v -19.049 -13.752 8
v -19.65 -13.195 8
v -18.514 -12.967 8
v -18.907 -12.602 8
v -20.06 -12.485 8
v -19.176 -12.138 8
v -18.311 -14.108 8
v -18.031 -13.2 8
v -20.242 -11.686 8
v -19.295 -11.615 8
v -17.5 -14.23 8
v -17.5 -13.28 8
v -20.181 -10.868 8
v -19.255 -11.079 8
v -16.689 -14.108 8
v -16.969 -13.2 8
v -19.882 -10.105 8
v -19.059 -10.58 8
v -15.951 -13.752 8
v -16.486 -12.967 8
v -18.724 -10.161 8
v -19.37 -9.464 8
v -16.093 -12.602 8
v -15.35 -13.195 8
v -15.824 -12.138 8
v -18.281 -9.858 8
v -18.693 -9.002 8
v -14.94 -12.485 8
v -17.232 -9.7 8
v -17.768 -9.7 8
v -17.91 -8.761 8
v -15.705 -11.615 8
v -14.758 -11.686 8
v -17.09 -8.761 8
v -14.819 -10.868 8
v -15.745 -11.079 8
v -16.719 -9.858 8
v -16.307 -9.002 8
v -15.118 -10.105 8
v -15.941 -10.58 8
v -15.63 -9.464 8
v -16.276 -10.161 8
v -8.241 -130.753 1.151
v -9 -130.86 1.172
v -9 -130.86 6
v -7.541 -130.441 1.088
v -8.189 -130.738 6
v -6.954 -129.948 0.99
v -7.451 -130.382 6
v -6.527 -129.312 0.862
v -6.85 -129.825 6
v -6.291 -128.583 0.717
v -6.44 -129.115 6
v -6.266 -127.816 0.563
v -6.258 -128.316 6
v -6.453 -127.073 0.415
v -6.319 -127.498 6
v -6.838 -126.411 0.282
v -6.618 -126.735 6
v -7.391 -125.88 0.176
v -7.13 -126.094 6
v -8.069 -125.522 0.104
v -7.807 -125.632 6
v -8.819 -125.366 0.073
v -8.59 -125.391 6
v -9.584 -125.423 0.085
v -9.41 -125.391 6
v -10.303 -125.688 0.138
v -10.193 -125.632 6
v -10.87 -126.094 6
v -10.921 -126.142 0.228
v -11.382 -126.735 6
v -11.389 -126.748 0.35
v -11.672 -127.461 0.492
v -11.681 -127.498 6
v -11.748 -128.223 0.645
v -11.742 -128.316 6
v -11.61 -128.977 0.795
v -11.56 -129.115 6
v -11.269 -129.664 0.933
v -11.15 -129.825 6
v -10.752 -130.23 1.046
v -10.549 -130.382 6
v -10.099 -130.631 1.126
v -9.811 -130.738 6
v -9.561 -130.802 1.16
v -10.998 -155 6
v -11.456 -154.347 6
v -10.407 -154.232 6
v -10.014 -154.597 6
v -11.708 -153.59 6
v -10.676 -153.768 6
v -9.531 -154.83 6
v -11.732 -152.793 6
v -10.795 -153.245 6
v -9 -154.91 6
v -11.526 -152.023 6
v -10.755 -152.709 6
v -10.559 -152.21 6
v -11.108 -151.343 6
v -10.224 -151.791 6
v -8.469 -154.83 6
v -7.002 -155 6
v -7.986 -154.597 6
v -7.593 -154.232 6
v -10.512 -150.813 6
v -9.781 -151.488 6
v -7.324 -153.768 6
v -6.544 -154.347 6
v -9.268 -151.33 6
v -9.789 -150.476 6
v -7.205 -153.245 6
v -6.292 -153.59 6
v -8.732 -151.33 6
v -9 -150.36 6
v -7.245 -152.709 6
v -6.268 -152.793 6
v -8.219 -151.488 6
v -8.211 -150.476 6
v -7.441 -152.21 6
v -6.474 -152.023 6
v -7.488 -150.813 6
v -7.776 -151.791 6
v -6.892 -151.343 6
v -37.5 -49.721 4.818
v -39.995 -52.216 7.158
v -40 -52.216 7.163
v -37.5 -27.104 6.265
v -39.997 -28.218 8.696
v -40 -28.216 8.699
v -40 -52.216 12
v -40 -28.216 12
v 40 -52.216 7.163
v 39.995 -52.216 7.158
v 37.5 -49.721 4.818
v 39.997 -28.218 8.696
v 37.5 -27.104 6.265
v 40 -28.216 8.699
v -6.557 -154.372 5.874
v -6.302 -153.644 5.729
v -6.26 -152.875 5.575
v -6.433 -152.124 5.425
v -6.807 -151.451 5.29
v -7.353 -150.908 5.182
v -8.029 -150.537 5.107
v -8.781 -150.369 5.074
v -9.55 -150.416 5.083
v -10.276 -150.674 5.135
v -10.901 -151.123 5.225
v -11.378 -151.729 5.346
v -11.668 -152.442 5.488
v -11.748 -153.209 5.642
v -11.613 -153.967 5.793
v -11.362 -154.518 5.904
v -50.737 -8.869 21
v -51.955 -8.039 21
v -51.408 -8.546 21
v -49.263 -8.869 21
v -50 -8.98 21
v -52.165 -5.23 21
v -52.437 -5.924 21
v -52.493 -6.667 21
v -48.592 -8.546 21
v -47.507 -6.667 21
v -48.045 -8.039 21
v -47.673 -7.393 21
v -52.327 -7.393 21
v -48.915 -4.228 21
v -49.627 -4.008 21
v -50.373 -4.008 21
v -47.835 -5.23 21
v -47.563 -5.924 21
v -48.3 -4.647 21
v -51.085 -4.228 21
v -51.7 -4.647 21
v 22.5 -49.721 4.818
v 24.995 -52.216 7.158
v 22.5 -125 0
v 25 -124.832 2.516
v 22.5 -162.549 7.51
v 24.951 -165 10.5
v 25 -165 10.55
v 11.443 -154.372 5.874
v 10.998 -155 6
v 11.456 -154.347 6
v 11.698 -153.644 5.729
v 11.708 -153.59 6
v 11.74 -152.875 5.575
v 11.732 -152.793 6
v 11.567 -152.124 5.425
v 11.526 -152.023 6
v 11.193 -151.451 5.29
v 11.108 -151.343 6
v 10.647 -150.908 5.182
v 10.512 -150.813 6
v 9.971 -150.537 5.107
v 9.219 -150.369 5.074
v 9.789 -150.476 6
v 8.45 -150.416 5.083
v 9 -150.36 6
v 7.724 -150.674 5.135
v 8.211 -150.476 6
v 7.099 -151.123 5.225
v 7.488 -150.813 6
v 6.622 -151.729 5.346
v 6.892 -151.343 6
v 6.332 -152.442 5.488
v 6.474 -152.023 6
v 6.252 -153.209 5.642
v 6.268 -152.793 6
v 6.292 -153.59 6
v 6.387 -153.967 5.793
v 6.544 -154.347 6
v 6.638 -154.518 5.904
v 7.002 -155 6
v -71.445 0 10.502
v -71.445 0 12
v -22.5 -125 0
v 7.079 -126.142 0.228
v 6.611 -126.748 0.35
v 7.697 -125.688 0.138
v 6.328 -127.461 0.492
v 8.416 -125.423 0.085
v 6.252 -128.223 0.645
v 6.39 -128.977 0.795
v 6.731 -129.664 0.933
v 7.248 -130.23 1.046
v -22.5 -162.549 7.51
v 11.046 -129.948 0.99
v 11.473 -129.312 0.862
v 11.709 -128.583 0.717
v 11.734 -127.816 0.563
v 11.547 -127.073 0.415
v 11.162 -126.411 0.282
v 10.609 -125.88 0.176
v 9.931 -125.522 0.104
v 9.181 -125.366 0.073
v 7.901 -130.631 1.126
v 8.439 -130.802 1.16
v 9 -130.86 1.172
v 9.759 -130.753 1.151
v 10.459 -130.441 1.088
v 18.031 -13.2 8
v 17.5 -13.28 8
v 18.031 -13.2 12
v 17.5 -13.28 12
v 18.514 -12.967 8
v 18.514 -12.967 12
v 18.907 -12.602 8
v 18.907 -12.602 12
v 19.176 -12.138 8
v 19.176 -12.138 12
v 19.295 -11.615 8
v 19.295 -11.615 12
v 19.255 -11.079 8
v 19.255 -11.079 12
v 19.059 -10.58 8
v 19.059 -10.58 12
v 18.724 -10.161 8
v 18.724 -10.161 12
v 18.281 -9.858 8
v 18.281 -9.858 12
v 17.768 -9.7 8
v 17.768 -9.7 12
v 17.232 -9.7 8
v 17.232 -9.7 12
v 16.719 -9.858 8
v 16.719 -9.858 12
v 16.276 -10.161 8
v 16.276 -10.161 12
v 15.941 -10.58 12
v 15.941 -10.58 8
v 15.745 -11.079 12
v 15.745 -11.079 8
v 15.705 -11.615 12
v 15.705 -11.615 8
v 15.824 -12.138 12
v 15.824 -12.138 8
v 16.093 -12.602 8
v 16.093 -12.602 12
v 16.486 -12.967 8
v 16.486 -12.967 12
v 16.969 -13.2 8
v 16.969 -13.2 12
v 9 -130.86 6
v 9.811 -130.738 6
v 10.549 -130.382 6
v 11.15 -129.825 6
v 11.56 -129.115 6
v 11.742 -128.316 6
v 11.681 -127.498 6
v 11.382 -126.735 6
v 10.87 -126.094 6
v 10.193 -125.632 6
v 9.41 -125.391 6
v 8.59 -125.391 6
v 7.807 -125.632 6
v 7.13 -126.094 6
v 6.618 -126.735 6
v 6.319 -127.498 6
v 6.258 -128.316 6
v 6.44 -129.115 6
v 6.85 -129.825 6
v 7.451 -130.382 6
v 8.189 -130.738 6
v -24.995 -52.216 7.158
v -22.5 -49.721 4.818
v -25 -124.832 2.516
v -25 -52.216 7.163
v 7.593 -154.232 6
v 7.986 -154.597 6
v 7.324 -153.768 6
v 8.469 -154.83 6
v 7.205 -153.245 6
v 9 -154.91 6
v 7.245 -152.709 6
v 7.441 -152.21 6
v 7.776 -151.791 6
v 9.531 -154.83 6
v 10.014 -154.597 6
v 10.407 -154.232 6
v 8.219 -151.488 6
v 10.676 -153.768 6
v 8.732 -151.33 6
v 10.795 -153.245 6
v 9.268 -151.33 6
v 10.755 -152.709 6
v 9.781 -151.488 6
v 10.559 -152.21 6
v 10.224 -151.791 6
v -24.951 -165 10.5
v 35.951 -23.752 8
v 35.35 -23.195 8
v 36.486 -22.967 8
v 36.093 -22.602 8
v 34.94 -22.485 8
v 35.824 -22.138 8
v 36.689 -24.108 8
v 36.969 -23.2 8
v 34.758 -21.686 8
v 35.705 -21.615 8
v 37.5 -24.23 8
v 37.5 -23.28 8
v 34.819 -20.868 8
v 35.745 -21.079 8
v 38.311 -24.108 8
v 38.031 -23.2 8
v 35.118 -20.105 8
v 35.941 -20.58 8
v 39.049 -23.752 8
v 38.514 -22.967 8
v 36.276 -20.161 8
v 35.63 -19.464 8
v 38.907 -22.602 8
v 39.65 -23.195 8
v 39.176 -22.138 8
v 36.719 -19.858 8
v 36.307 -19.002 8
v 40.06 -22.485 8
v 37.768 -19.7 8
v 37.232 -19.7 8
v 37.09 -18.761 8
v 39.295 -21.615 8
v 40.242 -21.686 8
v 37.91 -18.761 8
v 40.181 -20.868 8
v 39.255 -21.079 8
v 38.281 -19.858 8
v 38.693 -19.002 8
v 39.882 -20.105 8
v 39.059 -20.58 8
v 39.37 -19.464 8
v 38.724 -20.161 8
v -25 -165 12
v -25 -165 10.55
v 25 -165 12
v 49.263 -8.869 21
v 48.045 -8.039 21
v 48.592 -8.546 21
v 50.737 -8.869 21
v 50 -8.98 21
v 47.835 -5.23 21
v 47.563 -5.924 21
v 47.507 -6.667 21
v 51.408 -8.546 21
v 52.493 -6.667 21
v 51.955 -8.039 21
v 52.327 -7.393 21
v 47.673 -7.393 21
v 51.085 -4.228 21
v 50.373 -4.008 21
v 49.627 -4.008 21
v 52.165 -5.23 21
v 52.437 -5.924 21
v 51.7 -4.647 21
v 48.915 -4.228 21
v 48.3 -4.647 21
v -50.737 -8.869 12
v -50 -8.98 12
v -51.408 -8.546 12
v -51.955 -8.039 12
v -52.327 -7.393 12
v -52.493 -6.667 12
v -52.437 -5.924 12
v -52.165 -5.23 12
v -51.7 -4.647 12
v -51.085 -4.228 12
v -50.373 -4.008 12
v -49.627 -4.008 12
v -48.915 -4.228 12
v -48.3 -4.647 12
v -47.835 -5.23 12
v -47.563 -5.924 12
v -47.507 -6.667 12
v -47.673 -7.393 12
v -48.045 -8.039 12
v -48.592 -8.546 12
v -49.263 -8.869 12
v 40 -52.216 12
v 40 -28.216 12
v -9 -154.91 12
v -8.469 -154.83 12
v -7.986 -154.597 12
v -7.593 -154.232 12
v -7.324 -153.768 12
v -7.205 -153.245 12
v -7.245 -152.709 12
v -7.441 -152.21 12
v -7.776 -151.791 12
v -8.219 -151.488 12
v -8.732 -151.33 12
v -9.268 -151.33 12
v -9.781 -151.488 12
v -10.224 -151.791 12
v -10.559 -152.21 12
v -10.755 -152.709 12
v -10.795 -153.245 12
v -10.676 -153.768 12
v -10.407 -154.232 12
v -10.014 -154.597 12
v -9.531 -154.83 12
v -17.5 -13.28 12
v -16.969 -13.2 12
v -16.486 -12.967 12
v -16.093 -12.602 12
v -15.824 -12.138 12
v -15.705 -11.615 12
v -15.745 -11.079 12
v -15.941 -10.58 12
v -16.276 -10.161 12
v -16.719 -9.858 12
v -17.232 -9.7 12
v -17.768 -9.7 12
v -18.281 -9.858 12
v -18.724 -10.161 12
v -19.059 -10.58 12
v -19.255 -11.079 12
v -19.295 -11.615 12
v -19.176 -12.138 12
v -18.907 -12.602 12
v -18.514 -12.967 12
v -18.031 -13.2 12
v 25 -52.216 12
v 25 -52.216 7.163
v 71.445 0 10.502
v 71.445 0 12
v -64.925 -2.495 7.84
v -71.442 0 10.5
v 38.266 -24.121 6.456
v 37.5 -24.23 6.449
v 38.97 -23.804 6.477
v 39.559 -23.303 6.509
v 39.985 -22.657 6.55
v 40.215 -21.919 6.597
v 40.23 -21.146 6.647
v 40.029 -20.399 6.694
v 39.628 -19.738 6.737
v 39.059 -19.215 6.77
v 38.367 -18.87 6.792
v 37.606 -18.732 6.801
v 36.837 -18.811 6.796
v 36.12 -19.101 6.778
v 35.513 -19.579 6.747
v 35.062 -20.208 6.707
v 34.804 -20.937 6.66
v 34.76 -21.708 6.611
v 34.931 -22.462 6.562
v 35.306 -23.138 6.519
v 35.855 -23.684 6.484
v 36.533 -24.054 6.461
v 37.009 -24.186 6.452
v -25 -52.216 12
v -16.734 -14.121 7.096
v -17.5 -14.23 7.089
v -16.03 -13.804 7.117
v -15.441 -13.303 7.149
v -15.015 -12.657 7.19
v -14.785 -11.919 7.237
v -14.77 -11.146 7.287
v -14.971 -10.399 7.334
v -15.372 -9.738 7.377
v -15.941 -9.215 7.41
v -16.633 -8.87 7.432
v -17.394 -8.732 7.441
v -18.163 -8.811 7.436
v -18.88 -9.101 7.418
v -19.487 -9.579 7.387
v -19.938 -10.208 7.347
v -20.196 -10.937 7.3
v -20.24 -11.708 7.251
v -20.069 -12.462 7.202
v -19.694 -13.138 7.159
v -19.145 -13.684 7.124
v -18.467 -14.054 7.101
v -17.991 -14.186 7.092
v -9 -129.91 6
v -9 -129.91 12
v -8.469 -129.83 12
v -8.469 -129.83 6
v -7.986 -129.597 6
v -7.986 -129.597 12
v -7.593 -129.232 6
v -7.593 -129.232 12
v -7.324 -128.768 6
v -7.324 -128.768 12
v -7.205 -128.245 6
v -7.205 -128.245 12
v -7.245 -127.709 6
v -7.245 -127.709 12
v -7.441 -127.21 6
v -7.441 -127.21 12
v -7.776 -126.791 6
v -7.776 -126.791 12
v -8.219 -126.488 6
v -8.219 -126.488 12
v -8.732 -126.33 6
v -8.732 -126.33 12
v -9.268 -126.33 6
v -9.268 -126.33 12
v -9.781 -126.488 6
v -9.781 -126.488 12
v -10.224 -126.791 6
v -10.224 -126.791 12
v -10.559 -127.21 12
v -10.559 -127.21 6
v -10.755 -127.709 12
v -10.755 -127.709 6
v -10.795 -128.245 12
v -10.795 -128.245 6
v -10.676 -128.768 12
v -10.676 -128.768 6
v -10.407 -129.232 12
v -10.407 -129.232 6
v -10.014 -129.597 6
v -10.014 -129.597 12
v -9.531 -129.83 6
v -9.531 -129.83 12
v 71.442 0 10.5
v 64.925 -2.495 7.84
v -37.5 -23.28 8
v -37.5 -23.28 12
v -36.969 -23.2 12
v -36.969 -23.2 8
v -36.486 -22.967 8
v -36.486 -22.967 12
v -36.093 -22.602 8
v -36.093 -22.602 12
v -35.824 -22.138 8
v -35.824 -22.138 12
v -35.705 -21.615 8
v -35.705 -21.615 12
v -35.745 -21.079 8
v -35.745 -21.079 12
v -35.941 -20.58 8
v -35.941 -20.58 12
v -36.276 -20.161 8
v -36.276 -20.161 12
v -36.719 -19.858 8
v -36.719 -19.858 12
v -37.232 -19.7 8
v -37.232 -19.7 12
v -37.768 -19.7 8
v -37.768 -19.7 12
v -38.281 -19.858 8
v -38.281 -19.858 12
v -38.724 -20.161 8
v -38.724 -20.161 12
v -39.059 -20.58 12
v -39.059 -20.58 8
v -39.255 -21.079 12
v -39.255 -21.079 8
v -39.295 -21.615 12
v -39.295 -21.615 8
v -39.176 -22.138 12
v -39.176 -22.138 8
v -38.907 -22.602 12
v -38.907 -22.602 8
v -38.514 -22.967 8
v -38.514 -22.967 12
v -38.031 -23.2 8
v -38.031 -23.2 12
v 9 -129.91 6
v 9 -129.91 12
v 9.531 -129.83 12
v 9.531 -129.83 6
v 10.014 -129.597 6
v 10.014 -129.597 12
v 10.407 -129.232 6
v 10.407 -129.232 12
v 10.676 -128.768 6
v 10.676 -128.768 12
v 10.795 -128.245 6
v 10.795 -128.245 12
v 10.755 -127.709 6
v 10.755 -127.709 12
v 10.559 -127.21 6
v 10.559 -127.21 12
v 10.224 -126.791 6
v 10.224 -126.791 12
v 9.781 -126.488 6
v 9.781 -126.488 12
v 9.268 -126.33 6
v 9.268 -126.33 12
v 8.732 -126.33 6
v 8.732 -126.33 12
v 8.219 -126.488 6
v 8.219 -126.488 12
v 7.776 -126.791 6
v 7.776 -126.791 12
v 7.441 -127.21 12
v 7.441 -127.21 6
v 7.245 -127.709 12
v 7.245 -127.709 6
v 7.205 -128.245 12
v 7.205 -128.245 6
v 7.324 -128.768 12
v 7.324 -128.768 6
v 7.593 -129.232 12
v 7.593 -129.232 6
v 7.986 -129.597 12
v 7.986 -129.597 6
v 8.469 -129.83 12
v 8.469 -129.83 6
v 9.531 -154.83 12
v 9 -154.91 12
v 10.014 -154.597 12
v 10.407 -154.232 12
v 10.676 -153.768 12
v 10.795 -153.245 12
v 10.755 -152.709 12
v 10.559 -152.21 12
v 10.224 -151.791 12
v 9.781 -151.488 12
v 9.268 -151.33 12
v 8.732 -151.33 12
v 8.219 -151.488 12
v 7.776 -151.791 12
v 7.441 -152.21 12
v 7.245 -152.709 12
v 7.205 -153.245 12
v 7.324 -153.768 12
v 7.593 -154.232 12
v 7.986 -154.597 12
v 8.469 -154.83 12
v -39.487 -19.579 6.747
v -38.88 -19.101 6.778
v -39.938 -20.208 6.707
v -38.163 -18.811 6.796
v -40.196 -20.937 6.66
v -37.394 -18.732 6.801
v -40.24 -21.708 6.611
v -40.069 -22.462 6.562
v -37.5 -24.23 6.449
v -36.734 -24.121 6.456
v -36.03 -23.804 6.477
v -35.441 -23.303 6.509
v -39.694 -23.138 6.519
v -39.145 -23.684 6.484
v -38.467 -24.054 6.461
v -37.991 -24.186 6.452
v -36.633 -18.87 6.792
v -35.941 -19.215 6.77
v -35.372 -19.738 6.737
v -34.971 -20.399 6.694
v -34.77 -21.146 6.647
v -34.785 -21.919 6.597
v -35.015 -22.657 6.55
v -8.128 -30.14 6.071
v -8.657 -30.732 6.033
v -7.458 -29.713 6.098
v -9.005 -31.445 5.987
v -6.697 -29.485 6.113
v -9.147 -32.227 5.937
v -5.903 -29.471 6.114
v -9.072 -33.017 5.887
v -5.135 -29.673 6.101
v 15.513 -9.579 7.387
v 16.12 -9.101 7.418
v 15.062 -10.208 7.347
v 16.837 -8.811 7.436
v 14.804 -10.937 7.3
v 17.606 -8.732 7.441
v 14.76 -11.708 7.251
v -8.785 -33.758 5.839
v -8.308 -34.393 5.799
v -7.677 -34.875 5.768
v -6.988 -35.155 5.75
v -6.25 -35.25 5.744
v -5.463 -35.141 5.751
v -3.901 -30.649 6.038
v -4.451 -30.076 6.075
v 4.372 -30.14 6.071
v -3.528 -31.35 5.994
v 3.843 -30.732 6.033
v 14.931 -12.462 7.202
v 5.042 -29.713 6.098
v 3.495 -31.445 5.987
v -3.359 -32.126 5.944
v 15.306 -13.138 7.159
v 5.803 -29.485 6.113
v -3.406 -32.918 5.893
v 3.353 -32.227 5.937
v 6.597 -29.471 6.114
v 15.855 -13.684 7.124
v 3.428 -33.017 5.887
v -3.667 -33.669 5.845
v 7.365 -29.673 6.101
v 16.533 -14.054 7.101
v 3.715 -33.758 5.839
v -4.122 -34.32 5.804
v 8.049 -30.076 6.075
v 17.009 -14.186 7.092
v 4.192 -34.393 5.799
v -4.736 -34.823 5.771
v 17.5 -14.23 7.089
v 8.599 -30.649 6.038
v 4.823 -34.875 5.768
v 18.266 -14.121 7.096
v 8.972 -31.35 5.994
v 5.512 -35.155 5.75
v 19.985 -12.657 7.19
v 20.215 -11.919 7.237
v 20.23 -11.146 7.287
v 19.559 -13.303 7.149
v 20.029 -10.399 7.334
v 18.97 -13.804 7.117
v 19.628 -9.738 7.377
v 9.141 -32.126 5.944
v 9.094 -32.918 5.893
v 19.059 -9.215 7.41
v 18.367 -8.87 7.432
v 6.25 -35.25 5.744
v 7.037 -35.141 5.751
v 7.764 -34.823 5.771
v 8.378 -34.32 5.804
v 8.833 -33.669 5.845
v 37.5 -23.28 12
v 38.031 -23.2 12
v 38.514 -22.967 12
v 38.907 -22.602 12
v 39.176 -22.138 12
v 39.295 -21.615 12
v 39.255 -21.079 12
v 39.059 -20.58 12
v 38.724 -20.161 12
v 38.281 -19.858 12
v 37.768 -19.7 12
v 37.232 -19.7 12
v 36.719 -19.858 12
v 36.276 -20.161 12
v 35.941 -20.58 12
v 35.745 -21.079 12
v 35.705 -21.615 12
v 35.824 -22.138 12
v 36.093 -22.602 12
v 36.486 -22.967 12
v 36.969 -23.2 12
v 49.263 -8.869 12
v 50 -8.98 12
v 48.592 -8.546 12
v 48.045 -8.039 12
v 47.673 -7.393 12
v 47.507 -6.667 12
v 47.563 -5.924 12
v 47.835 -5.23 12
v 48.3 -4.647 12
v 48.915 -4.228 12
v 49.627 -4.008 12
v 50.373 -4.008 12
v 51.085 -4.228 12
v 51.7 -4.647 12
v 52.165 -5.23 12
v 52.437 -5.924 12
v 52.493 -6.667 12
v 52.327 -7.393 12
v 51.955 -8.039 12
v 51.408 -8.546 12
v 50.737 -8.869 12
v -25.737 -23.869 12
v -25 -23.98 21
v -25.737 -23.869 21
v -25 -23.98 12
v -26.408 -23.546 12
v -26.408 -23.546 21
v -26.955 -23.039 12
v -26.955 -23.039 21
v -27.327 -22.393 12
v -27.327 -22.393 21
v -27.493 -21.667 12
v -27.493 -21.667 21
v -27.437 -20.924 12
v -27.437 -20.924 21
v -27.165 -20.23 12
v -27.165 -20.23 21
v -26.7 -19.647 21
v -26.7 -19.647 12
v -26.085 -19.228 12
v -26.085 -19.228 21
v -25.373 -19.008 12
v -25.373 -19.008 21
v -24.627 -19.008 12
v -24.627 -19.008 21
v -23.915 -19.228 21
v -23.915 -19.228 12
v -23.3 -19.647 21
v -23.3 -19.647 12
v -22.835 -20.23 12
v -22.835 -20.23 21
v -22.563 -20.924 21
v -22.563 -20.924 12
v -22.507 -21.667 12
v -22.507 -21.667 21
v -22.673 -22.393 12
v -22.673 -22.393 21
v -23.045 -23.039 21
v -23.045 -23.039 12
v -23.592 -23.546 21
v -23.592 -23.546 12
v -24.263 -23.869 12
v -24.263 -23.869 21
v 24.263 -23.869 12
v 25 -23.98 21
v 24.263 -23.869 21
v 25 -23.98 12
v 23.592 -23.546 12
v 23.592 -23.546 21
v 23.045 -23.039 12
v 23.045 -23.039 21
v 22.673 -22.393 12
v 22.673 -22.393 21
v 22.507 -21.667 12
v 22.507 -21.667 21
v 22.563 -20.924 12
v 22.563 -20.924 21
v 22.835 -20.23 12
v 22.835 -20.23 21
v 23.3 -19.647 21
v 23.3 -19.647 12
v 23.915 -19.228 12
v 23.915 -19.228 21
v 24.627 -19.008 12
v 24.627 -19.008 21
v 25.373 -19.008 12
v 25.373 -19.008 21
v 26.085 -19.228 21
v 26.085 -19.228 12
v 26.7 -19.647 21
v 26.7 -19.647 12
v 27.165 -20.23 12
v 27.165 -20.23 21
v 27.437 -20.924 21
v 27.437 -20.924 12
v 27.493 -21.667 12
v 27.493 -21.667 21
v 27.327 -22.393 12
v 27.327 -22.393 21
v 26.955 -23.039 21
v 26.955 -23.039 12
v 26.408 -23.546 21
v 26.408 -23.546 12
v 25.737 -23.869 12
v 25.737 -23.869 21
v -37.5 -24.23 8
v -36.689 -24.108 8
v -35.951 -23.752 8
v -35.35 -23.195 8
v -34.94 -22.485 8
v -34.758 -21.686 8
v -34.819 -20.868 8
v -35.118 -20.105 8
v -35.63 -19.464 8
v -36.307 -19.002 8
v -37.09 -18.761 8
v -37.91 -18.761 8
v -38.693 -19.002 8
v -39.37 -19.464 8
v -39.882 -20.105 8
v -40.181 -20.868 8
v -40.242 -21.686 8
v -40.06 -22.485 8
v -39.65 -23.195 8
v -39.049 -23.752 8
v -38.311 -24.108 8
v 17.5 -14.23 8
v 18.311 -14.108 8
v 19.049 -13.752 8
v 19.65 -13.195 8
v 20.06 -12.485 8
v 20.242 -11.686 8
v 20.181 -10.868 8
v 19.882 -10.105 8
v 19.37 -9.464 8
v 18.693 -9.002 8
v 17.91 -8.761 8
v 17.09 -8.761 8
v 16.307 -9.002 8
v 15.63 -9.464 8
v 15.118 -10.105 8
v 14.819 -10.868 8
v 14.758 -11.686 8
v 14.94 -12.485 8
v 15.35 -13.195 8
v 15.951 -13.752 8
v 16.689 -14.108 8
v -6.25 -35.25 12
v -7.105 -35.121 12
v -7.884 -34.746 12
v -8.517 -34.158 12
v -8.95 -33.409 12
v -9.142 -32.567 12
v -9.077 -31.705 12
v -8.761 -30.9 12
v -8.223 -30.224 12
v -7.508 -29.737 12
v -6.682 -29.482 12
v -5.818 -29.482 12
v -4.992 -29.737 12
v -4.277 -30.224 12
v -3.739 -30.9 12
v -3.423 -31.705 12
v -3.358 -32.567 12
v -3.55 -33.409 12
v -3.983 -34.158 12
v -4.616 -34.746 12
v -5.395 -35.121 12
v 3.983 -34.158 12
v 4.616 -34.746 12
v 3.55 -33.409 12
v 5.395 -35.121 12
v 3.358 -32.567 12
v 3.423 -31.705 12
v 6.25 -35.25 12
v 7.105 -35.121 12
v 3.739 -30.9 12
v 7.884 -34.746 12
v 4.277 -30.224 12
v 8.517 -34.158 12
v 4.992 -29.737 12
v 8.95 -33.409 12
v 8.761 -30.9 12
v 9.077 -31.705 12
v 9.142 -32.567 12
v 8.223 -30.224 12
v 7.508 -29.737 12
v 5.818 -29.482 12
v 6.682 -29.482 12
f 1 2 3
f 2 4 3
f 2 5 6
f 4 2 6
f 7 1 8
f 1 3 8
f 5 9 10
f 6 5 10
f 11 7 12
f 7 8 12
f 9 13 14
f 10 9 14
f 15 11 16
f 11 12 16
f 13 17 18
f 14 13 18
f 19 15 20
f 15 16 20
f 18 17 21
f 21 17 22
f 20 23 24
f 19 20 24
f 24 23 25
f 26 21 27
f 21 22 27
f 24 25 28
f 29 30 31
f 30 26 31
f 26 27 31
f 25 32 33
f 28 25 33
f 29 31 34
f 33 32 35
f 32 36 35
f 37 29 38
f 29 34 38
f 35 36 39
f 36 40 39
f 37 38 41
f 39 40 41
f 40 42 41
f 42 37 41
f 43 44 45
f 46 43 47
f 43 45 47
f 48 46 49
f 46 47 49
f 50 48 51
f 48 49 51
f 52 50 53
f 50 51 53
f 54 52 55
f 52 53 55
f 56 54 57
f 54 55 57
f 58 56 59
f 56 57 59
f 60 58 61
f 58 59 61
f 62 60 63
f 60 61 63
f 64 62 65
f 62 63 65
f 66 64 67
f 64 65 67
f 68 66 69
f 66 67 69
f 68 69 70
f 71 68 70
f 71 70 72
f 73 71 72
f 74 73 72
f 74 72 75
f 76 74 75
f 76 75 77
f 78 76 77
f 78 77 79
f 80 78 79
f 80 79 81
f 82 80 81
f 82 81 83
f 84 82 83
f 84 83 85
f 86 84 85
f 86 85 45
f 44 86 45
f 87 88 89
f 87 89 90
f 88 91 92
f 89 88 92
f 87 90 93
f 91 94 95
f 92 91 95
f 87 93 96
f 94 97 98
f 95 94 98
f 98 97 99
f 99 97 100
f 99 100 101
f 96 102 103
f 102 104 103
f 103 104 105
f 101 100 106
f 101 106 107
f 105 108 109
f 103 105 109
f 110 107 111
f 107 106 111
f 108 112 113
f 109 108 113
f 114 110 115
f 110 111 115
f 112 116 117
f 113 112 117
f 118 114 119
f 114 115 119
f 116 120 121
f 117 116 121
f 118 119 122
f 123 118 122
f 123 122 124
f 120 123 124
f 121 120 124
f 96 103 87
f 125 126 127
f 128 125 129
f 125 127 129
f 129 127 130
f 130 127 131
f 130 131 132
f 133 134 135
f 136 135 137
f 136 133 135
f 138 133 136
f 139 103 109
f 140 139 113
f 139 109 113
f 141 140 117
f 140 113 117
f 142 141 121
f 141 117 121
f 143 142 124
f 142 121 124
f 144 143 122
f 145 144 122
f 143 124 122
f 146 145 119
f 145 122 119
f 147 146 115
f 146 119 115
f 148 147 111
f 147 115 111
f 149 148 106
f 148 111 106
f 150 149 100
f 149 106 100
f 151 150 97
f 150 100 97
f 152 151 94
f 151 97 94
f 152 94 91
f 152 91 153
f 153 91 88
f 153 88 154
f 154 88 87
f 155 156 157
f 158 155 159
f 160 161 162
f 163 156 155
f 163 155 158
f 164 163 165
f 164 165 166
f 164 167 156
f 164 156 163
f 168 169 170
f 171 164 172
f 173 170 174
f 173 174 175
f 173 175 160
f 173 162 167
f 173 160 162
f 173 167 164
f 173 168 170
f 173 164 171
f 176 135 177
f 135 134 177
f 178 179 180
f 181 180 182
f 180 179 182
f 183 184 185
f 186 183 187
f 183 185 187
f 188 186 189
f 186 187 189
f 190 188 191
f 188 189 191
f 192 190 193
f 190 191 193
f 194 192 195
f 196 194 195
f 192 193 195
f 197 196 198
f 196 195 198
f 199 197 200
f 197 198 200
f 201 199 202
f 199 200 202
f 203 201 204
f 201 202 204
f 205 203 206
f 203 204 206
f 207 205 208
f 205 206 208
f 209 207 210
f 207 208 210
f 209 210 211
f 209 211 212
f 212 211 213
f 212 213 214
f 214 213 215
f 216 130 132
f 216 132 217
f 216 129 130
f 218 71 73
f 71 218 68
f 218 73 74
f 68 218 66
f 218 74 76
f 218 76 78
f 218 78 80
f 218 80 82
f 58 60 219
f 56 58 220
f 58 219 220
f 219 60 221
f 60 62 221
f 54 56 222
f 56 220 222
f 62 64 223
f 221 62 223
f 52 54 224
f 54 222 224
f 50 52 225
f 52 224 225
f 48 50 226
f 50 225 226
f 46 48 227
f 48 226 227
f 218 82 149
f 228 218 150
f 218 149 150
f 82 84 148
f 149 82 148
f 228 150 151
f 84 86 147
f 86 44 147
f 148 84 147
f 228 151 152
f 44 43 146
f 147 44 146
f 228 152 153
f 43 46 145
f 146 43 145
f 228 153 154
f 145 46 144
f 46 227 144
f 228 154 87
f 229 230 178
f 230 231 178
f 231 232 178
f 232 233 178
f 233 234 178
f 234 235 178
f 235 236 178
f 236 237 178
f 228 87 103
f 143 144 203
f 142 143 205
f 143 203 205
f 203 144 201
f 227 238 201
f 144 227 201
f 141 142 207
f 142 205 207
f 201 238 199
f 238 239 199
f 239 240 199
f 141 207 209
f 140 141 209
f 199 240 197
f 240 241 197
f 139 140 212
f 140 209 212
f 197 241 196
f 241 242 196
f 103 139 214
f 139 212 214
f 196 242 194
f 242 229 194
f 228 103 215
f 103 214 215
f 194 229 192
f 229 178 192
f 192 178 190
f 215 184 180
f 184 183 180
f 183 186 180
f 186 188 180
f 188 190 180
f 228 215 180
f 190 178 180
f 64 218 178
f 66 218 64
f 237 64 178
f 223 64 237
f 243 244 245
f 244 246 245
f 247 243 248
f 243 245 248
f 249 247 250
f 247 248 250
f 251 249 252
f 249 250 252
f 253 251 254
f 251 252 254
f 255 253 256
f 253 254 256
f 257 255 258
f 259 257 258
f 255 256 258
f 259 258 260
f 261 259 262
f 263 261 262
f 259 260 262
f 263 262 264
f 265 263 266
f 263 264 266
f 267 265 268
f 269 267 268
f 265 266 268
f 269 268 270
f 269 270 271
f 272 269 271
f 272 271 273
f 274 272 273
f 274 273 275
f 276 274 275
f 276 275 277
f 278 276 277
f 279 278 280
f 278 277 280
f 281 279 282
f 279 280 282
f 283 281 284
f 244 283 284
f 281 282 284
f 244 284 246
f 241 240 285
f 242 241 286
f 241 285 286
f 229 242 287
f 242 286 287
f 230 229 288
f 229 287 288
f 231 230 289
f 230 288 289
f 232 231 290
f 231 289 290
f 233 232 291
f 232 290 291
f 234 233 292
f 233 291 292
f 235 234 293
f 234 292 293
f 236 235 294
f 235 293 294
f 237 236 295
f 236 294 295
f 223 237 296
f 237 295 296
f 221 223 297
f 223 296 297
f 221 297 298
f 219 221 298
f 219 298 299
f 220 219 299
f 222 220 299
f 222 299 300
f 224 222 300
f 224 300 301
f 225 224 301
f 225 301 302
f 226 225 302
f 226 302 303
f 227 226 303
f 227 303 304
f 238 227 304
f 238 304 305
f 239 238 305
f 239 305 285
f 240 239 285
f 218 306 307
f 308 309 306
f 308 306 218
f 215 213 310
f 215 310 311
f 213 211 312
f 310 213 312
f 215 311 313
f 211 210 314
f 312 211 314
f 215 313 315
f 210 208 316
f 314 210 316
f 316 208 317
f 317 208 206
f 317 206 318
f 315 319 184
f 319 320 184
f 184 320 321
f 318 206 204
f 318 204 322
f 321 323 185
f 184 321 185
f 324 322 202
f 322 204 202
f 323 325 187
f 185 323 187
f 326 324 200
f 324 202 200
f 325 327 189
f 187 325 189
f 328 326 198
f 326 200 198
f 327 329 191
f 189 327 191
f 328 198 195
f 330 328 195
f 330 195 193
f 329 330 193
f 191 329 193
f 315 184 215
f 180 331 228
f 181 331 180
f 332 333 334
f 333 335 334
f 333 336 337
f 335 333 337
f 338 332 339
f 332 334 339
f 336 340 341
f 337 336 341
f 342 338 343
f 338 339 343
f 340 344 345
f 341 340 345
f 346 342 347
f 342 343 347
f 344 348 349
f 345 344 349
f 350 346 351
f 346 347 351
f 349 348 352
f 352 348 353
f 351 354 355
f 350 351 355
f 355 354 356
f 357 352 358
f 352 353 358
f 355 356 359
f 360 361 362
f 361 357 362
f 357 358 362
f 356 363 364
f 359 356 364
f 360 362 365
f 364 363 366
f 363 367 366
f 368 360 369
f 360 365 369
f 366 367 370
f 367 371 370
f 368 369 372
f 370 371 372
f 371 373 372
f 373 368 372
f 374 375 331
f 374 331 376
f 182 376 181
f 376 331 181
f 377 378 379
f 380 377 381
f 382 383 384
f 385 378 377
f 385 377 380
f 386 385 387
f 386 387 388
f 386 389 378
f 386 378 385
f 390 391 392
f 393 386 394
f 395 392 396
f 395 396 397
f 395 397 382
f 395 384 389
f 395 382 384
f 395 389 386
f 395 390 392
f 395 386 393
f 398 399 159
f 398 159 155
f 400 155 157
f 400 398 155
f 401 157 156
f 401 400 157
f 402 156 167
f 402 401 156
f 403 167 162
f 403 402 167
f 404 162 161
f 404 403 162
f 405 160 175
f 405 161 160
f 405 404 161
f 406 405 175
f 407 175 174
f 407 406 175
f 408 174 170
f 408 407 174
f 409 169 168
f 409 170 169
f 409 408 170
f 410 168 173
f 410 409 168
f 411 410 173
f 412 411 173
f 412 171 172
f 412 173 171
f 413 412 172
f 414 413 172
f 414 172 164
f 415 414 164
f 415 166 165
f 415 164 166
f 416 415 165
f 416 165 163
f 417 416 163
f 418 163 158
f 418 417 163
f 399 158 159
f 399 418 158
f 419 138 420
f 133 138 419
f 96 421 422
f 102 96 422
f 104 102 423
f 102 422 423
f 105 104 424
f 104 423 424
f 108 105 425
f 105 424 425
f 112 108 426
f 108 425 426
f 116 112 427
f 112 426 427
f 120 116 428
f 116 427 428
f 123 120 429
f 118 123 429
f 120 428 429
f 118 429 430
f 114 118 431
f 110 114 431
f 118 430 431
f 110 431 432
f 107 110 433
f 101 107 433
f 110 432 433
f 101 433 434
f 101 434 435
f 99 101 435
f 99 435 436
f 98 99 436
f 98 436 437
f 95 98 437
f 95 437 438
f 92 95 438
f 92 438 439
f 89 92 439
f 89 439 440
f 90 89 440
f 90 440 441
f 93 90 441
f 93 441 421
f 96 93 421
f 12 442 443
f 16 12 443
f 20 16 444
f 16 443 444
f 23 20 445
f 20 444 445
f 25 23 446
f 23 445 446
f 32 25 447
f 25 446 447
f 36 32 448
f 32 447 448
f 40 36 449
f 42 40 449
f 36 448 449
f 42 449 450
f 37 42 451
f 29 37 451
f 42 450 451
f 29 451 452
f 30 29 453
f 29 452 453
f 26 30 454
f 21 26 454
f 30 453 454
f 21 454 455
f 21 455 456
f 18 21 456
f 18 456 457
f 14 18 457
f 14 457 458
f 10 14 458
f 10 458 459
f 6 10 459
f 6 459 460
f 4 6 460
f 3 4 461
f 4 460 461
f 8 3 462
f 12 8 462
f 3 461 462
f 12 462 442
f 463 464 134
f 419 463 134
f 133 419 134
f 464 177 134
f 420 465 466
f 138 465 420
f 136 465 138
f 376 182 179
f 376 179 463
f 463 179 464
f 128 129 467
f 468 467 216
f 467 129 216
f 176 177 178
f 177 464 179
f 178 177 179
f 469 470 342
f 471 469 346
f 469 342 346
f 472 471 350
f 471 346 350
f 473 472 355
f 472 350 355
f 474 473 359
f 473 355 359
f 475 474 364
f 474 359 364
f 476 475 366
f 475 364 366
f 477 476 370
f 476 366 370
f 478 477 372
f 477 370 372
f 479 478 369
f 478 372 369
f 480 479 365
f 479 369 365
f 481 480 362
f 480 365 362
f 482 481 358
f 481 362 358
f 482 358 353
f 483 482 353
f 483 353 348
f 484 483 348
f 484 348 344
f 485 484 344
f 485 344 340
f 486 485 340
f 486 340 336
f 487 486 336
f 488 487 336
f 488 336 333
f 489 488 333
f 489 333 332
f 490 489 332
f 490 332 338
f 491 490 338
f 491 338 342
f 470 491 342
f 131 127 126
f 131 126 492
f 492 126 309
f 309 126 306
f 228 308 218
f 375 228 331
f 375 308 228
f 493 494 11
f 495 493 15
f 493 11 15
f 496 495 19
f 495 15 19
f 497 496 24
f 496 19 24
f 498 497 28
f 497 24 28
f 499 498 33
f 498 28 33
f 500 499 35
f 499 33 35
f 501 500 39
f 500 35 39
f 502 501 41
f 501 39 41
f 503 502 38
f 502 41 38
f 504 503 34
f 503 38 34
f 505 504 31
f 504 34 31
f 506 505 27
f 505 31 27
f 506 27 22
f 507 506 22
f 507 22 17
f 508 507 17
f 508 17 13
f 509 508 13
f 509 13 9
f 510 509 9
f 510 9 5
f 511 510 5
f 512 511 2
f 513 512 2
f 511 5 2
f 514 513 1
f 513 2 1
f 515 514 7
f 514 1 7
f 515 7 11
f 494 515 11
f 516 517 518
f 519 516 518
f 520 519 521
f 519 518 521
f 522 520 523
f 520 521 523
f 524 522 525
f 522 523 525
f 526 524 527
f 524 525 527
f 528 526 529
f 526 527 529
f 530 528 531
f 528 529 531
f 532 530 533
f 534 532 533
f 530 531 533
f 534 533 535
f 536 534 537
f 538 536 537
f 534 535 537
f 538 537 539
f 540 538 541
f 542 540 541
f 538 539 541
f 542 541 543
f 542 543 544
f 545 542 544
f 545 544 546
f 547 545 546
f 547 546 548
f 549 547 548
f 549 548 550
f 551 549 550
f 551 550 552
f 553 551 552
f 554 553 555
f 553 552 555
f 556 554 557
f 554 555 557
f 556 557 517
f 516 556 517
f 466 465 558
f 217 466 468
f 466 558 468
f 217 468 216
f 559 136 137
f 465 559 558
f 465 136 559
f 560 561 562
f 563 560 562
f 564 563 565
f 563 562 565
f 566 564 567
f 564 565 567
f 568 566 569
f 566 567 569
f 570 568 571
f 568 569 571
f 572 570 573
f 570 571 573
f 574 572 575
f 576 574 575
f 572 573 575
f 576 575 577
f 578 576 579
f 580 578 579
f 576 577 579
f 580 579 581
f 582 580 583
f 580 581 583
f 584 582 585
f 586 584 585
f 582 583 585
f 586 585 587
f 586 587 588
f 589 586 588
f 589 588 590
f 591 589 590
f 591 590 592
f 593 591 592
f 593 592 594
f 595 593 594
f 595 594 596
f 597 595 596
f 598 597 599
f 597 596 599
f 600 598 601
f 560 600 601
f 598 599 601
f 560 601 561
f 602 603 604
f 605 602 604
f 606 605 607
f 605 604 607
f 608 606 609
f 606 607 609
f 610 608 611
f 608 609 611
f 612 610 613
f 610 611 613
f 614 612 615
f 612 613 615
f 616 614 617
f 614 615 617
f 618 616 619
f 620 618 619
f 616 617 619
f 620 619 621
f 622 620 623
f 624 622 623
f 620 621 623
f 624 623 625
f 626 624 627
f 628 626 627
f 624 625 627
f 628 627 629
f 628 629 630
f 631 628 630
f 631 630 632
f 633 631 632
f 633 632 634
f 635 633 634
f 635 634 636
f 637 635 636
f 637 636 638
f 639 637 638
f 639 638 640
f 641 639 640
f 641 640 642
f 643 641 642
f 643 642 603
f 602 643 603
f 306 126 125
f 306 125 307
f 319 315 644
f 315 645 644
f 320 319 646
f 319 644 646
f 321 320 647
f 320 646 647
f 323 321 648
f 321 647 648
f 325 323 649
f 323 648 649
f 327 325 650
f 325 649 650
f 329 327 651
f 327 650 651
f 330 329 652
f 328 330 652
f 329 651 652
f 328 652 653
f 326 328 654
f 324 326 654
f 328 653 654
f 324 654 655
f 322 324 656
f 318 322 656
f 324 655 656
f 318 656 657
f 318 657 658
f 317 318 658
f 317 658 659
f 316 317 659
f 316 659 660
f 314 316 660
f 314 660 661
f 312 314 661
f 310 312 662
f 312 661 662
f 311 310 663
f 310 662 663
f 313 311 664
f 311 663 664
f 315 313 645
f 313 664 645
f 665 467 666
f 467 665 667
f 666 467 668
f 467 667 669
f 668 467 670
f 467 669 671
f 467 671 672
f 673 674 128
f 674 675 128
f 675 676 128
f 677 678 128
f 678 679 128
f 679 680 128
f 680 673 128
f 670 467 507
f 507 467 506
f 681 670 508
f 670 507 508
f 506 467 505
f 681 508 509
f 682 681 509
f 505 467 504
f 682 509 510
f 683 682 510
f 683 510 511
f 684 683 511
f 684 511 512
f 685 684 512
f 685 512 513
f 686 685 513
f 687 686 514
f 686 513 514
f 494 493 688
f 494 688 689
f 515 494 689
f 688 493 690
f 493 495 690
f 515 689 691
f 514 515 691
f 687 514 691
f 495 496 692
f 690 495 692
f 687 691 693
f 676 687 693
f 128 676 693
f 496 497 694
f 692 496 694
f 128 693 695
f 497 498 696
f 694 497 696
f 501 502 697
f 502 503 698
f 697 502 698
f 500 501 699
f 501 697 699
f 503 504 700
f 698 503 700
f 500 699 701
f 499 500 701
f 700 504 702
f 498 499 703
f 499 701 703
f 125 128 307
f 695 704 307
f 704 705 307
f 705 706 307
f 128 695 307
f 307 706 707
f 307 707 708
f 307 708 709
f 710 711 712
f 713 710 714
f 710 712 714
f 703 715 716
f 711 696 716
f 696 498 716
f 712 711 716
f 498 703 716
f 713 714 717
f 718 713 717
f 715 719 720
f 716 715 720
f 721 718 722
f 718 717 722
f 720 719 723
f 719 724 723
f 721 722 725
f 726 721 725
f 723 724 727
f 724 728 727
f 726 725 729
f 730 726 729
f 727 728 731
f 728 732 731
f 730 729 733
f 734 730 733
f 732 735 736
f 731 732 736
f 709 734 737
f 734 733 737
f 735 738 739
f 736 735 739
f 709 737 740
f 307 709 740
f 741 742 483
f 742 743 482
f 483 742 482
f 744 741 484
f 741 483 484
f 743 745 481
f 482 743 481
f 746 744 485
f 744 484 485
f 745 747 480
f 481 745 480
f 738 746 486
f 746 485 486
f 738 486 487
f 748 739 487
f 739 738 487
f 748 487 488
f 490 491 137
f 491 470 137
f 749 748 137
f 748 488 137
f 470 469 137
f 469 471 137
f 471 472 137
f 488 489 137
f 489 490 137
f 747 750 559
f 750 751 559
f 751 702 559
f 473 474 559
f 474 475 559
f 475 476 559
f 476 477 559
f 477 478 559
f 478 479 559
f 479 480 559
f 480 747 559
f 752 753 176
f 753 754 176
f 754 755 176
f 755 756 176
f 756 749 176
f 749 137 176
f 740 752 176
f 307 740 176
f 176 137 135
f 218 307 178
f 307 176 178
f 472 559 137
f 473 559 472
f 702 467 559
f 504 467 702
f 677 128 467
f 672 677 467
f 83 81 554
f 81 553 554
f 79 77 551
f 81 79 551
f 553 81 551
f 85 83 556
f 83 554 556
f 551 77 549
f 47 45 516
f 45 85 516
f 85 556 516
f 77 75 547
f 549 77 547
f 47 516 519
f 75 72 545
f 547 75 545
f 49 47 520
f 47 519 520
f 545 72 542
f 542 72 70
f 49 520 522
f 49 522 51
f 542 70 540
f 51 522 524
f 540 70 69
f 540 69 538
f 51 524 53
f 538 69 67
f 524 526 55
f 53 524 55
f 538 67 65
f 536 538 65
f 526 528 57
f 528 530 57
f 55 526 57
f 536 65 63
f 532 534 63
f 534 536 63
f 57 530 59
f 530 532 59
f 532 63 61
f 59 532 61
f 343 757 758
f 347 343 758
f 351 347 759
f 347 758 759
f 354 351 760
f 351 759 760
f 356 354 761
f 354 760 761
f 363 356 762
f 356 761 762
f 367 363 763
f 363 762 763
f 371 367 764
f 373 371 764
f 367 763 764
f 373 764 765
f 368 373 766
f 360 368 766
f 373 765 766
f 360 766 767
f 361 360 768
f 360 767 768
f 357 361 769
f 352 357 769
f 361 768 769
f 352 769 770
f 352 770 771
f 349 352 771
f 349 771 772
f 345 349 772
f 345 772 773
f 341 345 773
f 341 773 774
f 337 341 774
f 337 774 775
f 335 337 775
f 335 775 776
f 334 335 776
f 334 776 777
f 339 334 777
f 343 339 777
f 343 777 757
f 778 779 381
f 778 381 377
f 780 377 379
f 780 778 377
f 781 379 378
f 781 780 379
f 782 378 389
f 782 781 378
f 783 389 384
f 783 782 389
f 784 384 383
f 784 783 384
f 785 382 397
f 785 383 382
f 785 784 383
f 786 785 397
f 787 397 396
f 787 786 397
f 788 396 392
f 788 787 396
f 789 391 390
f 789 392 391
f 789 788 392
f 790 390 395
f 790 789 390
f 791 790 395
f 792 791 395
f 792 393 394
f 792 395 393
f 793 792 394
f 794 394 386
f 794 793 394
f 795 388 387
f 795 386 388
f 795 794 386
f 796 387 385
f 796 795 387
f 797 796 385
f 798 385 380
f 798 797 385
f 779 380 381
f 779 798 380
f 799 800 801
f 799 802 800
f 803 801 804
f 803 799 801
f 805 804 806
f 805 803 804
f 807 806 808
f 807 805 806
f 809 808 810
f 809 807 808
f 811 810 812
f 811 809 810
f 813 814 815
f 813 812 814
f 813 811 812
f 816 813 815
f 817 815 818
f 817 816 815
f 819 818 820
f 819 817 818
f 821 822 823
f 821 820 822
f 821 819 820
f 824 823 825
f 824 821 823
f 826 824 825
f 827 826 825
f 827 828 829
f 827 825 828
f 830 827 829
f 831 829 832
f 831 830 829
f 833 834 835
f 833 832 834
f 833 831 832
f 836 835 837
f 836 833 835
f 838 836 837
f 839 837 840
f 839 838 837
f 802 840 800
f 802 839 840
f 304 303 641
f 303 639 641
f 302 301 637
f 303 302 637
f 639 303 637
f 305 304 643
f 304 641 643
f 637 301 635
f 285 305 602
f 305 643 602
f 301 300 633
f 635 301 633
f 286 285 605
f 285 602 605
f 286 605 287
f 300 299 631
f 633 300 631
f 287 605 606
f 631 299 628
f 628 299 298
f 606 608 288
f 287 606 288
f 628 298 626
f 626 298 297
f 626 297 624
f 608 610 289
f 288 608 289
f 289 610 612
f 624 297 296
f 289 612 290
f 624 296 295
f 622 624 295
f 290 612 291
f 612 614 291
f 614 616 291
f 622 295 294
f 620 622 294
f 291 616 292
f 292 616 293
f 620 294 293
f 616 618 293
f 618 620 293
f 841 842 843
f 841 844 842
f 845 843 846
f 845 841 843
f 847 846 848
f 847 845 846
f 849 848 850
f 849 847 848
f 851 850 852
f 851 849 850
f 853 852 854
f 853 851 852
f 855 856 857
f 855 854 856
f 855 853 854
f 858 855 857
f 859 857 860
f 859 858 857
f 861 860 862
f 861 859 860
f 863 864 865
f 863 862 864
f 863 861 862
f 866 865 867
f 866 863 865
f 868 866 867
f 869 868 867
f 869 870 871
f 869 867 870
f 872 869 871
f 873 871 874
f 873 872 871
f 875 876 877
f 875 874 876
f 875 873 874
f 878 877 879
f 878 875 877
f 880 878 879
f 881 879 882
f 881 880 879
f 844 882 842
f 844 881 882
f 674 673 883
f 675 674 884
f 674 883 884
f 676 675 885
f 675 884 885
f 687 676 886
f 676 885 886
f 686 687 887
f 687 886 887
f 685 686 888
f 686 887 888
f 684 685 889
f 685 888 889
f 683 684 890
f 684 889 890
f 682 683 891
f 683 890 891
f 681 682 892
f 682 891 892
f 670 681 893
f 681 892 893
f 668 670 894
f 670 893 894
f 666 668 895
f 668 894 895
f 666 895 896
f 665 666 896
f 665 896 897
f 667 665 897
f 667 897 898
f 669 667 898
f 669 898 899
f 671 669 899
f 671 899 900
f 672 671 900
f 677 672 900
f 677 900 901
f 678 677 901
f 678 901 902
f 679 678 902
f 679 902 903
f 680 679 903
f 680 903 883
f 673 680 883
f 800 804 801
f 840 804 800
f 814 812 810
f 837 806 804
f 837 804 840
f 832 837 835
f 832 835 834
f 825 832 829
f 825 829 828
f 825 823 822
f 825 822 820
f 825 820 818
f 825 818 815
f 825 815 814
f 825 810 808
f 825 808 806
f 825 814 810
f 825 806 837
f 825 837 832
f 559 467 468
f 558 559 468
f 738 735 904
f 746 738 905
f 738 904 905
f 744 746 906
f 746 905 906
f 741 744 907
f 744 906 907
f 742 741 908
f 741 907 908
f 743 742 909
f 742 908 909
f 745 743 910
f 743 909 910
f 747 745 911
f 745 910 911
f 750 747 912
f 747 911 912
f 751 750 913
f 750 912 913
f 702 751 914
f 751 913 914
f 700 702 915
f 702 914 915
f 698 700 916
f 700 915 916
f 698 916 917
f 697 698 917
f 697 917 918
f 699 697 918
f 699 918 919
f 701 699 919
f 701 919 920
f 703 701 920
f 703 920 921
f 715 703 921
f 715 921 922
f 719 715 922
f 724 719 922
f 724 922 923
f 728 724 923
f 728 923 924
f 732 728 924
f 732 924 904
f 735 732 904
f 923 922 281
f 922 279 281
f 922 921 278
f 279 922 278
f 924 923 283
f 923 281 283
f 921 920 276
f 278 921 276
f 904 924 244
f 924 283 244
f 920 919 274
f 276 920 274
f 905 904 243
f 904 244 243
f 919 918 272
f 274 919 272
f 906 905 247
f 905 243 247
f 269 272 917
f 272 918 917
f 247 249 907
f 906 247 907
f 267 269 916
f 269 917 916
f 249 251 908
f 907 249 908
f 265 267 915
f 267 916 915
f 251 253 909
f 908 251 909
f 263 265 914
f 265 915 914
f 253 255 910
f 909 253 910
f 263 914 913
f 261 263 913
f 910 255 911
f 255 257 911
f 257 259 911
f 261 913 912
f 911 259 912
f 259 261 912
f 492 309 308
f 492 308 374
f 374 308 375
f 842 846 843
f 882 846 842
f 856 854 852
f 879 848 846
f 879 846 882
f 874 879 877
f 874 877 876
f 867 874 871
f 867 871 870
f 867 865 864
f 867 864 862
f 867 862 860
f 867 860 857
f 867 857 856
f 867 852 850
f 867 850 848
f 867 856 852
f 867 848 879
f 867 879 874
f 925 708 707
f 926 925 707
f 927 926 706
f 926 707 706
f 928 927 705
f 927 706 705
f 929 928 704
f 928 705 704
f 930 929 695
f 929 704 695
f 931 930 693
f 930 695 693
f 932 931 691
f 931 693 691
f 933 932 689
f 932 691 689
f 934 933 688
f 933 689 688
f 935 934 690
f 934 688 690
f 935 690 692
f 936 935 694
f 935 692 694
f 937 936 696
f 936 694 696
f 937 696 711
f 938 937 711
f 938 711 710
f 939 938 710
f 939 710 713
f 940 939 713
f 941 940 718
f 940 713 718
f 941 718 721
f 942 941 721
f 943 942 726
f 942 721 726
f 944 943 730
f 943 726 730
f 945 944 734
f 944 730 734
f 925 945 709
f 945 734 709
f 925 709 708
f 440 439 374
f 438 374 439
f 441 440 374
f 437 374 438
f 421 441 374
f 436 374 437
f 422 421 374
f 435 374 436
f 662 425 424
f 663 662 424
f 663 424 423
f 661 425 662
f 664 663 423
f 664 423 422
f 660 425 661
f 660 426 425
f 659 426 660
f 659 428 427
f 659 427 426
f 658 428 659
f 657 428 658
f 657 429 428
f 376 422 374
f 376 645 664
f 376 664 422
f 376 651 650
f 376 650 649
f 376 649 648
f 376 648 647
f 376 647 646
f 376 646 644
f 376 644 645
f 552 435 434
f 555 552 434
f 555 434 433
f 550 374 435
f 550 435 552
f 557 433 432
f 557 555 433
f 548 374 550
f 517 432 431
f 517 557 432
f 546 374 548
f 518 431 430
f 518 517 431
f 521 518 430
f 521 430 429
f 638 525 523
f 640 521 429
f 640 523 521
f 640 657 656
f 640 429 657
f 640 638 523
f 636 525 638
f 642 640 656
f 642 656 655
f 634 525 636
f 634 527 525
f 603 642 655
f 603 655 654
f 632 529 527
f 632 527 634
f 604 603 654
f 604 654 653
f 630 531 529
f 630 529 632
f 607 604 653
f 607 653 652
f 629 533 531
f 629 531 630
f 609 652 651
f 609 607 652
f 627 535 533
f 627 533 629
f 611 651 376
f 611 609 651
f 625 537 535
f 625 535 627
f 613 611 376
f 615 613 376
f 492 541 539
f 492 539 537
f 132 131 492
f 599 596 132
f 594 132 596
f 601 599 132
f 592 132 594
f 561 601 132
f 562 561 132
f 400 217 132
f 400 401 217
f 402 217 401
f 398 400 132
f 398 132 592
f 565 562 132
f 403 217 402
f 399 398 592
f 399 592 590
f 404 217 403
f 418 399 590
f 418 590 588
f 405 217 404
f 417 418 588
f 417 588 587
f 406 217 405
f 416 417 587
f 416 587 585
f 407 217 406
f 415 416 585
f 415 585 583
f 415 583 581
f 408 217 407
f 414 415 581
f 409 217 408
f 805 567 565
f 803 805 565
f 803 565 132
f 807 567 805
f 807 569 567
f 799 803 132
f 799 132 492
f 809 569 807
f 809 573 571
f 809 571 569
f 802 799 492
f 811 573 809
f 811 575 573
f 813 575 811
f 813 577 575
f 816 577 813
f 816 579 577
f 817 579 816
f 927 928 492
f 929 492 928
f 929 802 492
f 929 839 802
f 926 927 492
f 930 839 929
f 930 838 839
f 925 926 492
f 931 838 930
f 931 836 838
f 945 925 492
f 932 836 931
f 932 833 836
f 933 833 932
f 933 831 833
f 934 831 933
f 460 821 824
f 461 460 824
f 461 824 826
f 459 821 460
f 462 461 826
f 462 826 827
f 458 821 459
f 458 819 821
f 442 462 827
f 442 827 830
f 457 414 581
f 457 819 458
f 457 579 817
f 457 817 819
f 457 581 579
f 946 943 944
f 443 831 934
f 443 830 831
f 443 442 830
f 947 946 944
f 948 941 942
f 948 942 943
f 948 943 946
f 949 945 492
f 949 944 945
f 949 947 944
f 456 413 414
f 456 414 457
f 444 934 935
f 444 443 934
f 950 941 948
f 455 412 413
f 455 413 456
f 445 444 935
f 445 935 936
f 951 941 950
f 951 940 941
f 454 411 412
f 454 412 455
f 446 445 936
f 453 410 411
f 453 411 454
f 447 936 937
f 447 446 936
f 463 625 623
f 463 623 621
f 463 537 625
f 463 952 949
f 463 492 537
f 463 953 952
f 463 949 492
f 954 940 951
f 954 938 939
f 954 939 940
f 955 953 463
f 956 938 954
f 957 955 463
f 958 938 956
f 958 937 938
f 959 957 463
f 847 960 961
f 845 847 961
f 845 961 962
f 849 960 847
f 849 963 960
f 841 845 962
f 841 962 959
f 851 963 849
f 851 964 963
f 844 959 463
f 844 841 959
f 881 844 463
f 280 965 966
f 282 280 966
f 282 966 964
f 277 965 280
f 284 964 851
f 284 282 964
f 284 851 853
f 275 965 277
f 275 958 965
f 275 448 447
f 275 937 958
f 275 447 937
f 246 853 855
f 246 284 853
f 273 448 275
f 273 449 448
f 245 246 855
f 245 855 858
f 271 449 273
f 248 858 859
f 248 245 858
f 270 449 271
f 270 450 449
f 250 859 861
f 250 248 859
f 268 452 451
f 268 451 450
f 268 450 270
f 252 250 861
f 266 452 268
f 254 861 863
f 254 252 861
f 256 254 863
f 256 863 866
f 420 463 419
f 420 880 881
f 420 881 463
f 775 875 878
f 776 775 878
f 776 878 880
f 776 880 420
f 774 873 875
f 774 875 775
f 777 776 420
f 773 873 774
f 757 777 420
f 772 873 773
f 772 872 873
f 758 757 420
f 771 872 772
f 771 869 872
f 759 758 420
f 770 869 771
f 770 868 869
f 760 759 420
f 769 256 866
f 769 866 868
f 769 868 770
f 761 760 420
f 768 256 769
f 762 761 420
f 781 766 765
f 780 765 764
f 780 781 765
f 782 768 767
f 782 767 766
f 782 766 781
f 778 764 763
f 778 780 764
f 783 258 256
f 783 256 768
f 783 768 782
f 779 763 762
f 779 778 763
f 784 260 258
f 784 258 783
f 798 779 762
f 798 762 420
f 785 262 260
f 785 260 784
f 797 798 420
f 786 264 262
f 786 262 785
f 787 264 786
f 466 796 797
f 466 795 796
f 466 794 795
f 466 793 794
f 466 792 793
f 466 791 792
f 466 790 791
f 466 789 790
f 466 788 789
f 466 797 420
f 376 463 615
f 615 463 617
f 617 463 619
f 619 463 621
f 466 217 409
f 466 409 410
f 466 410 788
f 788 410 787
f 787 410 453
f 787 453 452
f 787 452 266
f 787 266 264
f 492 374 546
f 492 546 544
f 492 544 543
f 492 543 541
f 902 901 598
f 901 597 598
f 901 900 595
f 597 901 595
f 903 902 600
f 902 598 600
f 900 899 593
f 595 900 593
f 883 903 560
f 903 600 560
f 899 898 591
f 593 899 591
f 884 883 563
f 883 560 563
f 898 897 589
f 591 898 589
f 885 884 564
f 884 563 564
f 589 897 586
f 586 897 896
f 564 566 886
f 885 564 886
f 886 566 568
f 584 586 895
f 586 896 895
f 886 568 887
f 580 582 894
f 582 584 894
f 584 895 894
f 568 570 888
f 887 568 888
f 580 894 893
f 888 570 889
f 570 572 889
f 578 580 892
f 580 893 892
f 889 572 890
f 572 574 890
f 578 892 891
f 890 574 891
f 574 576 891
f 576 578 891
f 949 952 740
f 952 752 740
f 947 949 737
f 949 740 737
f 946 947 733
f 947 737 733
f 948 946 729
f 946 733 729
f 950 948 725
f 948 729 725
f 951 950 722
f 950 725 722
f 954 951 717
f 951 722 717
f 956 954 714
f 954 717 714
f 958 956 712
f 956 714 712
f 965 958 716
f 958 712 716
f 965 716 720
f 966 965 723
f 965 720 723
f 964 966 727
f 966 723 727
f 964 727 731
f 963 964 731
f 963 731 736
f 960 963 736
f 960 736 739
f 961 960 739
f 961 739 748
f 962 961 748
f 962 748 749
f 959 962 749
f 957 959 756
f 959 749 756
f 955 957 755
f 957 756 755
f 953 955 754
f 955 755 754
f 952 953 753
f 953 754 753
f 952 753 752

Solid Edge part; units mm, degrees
sketch "Sketch1" plane through (0, 0, 0) normal (0, 0, 1) x (1, 0, 0)
  line L0 (0, 0) -> (-71.445, 0)
  line L1 (-40, -28.2156) -> (-71.445, 0)
  line L2 (-40, -52.2156) -> (-40, -28.2156)
  line L3 (-40, -52.2156) -> (-25, -52.2156)
  line L4 (-25, -52.2156) -> (-25, -165)
  line L5 (-25, -165) -> (0, -165)
  line L6 (0, -165) -> (0, 0)
  dimension "D1" = 15
  dimension "D2" = 165
  dimension "D3" = 24
  dimension "D4" = 71.445
extrude "Protrusion1" add sketch "Sketch1" along normal blind 12
sketch "Sketch2" plane through (0, -70, 6) normal (1, 0, 0) x (0, 1, 0)
  line L0 (70, 2) -> (-55, -6)
  line L1 (-55, -6) -> (-95, 2)
  dimension "D1" = 4
  dimension "D2" = 4
  dimension "D3" = 125
extrude "Extrusionsausschnitt_1" cut sketch "Sketch2" against normal blind 220 material side at (0, -62.4968, 3.9501)
mirror "Mirror1" about plane through (0, 0, 0) normal (-1, 0, 0) of "Protrusion1", "Extrusionsausschnitt_1"
chamfer "Fase_2" distance 2.5 angle 45 12 edges at (25, -88.6078, 2.3291) (25, -145, 4) (0, -165, 8) (-25, -145, 4) (-25, -88.6078, 2.3291) (-32.5, -52.2156, 4.6582) (32.5, -52.2156, 4.6582) (0, 0, 8) (40, -40.2156, 5.4262) (55.7225, -14.1078, 7.0971) (-40, -40.2156, 5.4262) (-55.7225, -14.1078, 7.0971)
sketch "Sketch3" plane through (0, -82.5, 12) normal (0, 0, 1) x (0, -1, 0)
  circle A0 centre (-76.02, 50) radius 2.5
  circle A1 centre (-61.02, 25) radius 2.5
  circle A2 centre (-61.02, -25) radius 2.5
  circle A3 centre (-76.02, -50) radius 2.5
  dimension "D1" = 21.48
  dimension "D2" = 50
  dimension "D3" = 25
  dimension "D4" = 100
  dimension "D5" = 50
  dimension "D6" = 15
  dimension "D7" = 5
  dimension "D8" = 5
  dimension "D9" = 5
  dimension "D10" = 5
extrude "Extrusionsausprägung_3" add sketch "Sketch3" along normal blind 9
hole "Bohrung_1" at (37.5, -21.48, 12) direction (0, 0, -1) diameter 3.6 end up to next
hole "Hole1" at (-37.5, -21.48, 12) direction (0, 0, -1) diameter 3.6 end up to next
hole "Hole2" at (-17.5, -11.48, 12) direction (0, 0, -1) diameter 3.6 end up to next
hole "Hole3" at (17.5, -11.48, 12) direction (0, 0, -1) diameter 3.6 end up to next
hole "Bohrung_5" at (-6.25, -32.35, 12) direction (0, 0, -1) diameter 5.8 depth 7
hole "Hole4" at (6.25, -32.35, 12) direction (0, 0, -1) diameter 5.8 depth 7
sketch "Sketch4" plane through (0, -82.5, 8) normal (0, 0, 1) x (0, -1, 0)
  circle A0 centre (-61.02, 37.5) radius 2.75
  circle A1 centre (-71.02, 17.5) radius 2.75
  circle A2 centre (-71.02, -17.5) radius 2.75
  circle A3 centre (-61.02, -37.5) radius 2.75
  dimension "D1" = 5.5
  dimension "D2" = 5.5
  dimension "D3" = 5.5
  dimension "D4" = 5.5
extrude "Extrusionsausschnitt_3" cut sketch "Sketch4" against normal blind 10
hole "Bohrung_7" at (9, -153.11, 12) direction (0, 0, -1) diameter 3.6 end up to next
hole "Hole5" at (-9, -153.11, 12) direction (0, 0, -1) diameter 3.6 end up to next
hole "Hole6" at (-9, -128.11, 12) direction (0, 0, -1) diameter 3.6 end up to next
hole "Hole7" at (9, -128.11, 12) direction (0, 0, -1) diameter 3.6 end up to next
sketch "Sketch5" plane through (0, -82.5, 6) normal (0, 0, 1) x (0, -1, 0)
  circle A0 centre (45.61, 9) radius 2.75
  circle A1 centre (70.61, 9) radius 2.75
  circle A2 centre (70.61, -9) radius 2.75
  circle A3 centre (45.61, -9) radius 2.75
  dimension "D1" = 5.5
  dimension "D2" = 5.5
  dimension "D3" = 5.5
  dimension "D4" = 5.5
extrude "Extrusionsausschnitt_4" cut sketch "Sketch5" against normal blind 17.8534
properties part number "49" material "Polyacticacid"
